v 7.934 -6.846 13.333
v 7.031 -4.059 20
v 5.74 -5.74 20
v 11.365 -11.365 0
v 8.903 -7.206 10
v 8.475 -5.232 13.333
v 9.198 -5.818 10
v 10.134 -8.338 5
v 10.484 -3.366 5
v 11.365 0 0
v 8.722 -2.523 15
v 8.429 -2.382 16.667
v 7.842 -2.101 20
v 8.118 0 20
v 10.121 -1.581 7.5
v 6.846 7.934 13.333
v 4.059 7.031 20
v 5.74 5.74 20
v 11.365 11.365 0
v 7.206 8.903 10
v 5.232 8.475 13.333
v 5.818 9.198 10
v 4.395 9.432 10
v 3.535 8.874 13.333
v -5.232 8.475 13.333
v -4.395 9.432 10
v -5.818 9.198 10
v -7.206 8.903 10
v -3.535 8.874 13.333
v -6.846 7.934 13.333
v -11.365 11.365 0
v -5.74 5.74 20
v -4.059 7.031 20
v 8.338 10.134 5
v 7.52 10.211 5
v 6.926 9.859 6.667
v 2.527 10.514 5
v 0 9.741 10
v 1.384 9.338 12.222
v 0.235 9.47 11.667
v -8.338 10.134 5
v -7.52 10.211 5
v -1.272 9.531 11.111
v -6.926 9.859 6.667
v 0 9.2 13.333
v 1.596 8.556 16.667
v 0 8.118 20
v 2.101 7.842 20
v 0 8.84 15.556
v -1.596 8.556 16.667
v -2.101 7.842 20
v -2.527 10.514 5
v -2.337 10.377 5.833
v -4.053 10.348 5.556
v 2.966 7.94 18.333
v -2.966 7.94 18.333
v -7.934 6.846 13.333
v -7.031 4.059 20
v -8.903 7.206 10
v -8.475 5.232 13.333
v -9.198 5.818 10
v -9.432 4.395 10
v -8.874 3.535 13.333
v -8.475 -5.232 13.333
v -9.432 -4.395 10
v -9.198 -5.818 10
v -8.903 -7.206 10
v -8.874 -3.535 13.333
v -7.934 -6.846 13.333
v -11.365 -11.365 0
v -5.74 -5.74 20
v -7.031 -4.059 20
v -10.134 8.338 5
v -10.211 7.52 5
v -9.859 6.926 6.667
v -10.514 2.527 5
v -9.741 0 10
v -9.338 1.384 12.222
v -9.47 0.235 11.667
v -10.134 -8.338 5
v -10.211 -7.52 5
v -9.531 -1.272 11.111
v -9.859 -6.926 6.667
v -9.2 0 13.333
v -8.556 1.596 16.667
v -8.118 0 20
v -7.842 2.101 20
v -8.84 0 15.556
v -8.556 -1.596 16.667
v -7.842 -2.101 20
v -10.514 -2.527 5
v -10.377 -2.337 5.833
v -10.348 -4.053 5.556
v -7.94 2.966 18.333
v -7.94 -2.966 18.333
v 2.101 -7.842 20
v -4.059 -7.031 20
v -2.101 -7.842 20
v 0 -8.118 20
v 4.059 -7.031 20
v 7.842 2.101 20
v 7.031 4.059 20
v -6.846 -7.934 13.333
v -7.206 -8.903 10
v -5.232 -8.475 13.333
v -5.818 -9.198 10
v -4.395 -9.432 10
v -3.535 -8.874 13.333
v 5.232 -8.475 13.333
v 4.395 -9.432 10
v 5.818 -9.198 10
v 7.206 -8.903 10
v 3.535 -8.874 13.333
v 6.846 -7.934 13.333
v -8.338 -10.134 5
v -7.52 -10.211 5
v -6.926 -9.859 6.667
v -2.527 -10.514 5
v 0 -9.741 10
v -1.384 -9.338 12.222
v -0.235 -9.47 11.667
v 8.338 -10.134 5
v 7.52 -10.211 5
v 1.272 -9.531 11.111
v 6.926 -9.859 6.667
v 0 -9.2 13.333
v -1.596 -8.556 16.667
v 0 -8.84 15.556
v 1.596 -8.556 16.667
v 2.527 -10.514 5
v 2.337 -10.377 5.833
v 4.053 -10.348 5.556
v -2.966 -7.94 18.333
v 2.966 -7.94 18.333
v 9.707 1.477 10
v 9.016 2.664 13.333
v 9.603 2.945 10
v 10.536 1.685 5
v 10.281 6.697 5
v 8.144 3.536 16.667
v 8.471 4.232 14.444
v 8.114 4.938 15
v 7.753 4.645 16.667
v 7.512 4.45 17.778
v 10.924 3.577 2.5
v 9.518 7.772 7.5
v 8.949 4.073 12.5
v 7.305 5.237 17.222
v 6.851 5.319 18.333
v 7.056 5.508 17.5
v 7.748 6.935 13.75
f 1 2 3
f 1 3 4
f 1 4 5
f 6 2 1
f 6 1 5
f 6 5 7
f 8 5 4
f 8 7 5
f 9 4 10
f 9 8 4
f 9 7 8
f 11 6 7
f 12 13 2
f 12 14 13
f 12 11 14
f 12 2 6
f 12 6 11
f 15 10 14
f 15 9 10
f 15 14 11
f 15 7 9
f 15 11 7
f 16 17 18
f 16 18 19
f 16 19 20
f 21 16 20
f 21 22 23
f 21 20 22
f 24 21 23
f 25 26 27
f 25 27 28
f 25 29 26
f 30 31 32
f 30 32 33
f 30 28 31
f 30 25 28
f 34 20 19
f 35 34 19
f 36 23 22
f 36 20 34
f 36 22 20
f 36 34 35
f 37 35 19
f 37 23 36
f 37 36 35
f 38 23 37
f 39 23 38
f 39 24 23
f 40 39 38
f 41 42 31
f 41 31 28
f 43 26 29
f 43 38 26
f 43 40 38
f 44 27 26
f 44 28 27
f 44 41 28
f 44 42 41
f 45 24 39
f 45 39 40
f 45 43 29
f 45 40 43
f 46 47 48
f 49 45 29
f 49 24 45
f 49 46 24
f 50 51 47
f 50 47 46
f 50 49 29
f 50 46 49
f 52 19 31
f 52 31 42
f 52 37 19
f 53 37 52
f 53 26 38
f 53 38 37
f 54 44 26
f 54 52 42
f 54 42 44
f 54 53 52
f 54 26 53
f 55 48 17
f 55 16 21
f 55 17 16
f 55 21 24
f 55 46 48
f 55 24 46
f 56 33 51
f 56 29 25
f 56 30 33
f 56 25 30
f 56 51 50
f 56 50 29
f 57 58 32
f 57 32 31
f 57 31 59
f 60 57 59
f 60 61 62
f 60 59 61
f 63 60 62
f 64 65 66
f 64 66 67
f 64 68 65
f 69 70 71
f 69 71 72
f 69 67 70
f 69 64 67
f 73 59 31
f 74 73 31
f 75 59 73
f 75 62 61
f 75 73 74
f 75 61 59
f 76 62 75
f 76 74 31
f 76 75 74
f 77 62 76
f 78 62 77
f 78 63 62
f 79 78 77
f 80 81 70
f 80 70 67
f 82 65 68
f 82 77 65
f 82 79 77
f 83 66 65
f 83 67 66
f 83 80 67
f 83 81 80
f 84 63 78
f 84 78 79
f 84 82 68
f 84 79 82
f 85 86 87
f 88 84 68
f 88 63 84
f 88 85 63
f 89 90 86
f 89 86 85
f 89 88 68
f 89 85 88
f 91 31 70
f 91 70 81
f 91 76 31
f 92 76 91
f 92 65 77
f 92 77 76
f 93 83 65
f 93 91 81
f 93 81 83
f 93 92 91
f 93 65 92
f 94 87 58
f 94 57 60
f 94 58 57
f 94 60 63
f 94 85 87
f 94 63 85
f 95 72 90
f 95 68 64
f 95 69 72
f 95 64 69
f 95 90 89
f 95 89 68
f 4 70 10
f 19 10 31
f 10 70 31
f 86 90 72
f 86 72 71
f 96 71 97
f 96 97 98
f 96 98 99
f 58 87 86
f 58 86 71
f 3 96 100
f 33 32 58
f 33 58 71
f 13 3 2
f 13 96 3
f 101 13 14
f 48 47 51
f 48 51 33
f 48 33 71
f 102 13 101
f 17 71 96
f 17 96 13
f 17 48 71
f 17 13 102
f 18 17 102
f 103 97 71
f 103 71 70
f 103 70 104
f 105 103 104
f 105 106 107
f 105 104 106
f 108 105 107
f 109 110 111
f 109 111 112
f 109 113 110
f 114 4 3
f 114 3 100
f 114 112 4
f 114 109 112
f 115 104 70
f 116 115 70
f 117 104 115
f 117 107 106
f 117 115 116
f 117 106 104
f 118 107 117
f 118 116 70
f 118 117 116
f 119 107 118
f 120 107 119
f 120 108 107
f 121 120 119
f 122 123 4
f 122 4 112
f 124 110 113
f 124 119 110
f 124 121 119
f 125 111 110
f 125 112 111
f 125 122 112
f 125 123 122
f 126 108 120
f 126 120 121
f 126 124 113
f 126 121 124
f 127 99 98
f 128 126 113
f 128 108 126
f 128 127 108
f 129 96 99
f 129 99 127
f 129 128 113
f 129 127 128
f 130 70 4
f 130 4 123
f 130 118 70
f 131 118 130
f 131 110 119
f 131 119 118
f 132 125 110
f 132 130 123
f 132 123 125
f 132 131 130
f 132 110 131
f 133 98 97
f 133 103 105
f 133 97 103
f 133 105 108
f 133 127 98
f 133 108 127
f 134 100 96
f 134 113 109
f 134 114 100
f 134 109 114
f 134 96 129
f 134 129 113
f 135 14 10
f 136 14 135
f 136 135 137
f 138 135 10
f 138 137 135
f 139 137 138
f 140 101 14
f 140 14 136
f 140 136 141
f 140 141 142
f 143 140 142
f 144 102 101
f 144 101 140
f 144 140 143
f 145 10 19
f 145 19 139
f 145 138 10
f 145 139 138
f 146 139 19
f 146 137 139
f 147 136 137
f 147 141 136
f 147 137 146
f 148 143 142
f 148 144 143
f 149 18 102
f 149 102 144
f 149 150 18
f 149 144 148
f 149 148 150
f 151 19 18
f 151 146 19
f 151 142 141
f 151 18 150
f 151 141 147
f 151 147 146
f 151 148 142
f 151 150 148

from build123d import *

# Parameters (mm, degrees)
SKETCH_W    = 22.72944
SKETCH_H    = 22.72944
SKETCH001_R = 8.118166


with BuildPart() as part:
    # Sketch → AdditiveLoft section 0
    with BuildSketch(Plane.XY):
        Rectangle(SKETCH_W, SKETCH_H)
    # Sketch001 → AdditiveLoft section 1
    with BuildSketch(Plane.XY.offset(20)):
        Circle(SKETCH001_R)
    loft()


solid = part.part
